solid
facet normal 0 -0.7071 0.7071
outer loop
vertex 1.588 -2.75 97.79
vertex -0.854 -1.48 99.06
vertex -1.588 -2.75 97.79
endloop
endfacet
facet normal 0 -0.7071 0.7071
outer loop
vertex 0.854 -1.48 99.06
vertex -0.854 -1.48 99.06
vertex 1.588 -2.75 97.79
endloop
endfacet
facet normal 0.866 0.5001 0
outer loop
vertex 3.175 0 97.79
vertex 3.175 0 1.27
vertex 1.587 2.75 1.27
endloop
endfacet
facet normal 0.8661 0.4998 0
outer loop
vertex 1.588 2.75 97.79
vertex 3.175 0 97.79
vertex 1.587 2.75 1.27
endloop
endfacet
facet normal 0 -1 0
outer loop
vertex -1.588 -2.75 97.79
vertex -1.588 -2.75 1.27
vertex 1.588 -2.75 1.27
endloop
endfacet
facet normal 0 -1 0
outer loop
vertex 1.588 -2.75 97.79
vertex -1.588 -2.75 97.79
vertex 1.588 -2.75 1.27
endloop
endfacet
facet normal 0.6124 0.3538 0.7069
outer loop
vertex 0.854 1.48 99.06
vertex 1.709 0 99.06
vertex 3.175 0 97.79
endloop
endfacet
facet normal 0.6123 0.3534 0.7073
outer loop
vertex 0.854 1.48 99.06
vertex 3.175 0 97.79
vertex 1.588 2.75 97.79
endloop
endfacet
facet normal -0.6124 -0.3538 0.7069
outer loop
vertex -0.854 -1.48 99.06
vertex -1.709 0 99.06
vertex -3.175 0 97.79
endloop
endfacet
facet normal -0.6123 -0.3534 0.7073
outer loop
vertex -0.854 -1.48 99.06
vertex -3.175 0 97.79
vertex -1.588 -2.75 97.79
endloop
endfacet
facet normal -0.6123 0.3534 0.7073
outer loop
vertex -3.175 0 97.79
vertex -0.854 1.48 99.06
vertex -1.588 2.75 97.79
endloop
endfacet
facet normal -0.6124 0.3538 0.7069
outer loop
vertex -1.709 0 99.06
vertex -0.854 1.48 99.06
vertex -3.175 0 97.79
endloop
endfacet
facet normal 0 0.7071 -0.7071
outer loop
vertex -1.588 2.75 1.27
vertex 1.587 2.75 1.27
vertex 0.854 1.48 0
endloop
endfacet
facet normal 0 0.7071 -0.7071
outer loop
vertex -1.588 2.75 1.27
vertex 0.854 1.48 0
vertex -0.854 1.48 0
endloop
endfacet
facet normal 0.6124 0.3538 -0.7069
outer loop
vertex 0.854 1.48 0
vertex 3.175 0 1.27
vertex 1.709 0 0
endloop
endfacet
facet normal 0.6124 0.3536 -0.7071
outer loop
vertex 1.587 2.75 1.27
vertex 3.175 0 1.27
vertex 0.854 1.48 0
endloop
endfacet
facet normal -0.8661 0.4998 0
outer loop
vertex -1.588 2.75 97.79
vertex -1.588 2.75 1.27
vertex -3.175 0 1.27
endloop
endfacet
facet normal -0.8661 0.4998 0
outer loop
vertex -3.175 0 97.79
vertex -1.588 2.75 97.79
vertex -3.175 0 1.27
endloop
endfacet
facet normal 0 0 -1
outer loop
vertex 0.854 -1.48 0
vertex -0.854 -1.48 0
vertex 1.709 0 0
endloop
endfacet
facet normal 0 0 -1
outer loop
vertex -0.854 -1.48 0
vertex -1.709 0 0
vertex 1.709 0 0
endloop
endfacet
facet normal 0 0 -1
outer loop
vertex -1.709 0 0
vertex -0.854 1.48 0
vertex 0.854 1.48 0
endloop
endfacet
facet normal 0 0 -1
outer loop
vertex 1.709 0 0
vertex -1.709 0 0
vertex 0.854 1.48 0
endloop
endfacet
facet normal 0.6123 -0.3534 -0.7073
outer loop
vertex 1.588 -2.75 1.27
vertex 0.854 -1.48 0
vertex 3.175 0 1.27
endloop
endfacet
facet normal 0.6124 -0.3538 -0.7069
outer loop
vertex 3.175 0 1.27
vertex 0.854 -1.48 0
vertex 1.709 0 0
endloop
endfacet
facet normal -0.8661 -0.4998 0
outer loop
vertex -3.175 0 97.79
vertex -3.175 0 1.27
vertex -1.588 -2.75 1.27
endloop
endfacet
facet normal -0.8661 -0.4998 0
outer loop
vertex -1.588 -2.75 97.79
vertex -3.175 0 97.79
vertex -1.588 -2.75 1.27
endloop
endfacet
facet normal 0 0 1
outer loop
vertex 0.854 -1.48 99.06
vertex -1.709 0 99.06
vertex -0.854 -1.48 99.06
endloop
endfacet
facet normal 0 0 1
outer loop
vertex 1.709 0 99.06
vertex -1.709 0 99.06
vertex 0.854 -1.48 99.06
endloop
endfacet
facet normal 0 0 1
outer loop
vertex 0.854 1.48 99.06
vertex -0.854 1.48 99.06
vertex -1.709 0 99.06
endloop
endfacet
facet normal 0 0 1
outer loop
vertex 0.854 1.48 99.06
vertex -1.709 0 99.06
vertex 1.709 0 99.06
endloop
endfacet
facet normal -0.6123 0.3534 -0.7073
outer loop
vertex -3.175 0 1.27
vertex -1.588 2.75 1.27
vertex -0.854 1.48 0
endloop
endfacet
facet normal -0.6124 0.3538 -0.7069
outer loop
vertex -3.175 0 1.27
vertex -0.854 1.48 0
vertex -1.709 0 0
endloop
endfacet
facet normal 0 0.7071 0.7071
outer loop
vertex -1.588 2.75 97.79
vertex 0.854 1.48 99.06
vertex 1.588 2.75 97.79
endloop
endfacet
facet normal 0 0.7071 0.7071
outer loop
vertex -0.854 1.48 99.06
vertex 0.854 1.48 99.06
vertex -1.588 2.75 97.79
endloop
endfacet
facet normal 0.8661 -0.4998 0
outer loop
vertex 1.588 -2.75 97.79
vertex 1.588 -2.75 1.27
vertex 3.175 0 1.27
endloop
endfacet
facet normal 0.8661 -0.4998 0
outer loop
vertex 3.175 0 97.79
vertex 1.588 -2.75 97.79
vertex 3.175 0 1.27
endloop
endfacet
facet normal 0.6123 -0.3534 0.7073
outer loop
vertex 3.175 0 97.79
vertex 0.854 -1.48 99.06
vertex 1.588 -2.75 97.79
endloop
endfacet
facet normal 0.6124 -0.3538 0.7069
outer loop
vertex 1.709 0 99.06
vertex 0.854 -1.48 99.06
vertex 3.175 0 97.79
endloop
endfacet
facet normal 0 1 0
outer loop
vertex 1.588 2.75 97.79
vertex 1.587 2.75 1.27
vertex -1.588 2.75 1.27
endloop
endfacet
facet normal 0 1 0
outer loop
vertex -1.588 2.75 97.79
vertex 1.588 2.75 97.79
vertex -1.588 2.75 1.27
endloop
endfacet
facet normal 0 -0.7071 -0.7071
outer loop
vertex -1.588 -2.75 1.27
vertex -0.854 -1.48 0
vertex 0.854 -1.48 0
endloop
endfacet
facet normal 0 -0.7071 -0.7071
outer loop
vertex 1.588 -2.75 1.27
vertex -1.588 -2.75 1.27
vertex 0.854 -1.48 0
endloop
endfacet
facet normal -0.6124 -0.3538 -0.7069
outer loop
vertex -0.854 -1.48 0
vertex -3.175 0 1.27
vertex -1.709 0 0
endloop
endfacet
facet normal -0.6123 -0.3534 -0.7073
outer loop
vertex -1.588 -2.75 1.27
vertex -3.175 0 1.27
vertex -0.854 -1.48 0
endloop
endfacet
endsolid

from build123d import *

# Parameters (mm, degrees)
F1_DEPTH = 99.06
F2_SIZE  = 1.27
F3_SIZE  = 1.27


with BuildPart() as f1:
    # F0 (on Top) → F1 (new body)
    with BuildSketch(Plane.XY):
        Polygon((1.5875, -2.749631), (3.175, 0), (1.5875, 2.749631), (-1.5875, 2.749631), (-3.175, 0), (-1.5875, -2.749631), align=None)
    extrude(amount=F1_DEPTH)

    # F2
    f2_edges = [f1.edges().sort_by_distance(p)[0] for p in [
        (0, -2.749631, 99.06),
        (2.38125, -1.374815, 99.06),
        (2.38125, 1.374815, 99.06),
        (0, 2.749631, 99.06),
        (-2.38125, 1.374815, 99.06),
        (-2.38125, -1.374815, 99.06),
    ]]
    chamfer(f2_edges, length=F2_SIZE)

    # F3
    f3_edges = [f1.edges().sort_by_distance(p)[0] for p in [
        (0, -2.749631, 0),
        (2.38125, -1.374815, 0),
        (2.38125, 1.374815, 0),
        (0, 2.749631, 0),
        (-2.38125, 1.374815, 0),
        (-2.38125, -1.374815, 0),
    ]]
    chamfer(f3_edges, length=F3_SIZE)


solid = f1.part
